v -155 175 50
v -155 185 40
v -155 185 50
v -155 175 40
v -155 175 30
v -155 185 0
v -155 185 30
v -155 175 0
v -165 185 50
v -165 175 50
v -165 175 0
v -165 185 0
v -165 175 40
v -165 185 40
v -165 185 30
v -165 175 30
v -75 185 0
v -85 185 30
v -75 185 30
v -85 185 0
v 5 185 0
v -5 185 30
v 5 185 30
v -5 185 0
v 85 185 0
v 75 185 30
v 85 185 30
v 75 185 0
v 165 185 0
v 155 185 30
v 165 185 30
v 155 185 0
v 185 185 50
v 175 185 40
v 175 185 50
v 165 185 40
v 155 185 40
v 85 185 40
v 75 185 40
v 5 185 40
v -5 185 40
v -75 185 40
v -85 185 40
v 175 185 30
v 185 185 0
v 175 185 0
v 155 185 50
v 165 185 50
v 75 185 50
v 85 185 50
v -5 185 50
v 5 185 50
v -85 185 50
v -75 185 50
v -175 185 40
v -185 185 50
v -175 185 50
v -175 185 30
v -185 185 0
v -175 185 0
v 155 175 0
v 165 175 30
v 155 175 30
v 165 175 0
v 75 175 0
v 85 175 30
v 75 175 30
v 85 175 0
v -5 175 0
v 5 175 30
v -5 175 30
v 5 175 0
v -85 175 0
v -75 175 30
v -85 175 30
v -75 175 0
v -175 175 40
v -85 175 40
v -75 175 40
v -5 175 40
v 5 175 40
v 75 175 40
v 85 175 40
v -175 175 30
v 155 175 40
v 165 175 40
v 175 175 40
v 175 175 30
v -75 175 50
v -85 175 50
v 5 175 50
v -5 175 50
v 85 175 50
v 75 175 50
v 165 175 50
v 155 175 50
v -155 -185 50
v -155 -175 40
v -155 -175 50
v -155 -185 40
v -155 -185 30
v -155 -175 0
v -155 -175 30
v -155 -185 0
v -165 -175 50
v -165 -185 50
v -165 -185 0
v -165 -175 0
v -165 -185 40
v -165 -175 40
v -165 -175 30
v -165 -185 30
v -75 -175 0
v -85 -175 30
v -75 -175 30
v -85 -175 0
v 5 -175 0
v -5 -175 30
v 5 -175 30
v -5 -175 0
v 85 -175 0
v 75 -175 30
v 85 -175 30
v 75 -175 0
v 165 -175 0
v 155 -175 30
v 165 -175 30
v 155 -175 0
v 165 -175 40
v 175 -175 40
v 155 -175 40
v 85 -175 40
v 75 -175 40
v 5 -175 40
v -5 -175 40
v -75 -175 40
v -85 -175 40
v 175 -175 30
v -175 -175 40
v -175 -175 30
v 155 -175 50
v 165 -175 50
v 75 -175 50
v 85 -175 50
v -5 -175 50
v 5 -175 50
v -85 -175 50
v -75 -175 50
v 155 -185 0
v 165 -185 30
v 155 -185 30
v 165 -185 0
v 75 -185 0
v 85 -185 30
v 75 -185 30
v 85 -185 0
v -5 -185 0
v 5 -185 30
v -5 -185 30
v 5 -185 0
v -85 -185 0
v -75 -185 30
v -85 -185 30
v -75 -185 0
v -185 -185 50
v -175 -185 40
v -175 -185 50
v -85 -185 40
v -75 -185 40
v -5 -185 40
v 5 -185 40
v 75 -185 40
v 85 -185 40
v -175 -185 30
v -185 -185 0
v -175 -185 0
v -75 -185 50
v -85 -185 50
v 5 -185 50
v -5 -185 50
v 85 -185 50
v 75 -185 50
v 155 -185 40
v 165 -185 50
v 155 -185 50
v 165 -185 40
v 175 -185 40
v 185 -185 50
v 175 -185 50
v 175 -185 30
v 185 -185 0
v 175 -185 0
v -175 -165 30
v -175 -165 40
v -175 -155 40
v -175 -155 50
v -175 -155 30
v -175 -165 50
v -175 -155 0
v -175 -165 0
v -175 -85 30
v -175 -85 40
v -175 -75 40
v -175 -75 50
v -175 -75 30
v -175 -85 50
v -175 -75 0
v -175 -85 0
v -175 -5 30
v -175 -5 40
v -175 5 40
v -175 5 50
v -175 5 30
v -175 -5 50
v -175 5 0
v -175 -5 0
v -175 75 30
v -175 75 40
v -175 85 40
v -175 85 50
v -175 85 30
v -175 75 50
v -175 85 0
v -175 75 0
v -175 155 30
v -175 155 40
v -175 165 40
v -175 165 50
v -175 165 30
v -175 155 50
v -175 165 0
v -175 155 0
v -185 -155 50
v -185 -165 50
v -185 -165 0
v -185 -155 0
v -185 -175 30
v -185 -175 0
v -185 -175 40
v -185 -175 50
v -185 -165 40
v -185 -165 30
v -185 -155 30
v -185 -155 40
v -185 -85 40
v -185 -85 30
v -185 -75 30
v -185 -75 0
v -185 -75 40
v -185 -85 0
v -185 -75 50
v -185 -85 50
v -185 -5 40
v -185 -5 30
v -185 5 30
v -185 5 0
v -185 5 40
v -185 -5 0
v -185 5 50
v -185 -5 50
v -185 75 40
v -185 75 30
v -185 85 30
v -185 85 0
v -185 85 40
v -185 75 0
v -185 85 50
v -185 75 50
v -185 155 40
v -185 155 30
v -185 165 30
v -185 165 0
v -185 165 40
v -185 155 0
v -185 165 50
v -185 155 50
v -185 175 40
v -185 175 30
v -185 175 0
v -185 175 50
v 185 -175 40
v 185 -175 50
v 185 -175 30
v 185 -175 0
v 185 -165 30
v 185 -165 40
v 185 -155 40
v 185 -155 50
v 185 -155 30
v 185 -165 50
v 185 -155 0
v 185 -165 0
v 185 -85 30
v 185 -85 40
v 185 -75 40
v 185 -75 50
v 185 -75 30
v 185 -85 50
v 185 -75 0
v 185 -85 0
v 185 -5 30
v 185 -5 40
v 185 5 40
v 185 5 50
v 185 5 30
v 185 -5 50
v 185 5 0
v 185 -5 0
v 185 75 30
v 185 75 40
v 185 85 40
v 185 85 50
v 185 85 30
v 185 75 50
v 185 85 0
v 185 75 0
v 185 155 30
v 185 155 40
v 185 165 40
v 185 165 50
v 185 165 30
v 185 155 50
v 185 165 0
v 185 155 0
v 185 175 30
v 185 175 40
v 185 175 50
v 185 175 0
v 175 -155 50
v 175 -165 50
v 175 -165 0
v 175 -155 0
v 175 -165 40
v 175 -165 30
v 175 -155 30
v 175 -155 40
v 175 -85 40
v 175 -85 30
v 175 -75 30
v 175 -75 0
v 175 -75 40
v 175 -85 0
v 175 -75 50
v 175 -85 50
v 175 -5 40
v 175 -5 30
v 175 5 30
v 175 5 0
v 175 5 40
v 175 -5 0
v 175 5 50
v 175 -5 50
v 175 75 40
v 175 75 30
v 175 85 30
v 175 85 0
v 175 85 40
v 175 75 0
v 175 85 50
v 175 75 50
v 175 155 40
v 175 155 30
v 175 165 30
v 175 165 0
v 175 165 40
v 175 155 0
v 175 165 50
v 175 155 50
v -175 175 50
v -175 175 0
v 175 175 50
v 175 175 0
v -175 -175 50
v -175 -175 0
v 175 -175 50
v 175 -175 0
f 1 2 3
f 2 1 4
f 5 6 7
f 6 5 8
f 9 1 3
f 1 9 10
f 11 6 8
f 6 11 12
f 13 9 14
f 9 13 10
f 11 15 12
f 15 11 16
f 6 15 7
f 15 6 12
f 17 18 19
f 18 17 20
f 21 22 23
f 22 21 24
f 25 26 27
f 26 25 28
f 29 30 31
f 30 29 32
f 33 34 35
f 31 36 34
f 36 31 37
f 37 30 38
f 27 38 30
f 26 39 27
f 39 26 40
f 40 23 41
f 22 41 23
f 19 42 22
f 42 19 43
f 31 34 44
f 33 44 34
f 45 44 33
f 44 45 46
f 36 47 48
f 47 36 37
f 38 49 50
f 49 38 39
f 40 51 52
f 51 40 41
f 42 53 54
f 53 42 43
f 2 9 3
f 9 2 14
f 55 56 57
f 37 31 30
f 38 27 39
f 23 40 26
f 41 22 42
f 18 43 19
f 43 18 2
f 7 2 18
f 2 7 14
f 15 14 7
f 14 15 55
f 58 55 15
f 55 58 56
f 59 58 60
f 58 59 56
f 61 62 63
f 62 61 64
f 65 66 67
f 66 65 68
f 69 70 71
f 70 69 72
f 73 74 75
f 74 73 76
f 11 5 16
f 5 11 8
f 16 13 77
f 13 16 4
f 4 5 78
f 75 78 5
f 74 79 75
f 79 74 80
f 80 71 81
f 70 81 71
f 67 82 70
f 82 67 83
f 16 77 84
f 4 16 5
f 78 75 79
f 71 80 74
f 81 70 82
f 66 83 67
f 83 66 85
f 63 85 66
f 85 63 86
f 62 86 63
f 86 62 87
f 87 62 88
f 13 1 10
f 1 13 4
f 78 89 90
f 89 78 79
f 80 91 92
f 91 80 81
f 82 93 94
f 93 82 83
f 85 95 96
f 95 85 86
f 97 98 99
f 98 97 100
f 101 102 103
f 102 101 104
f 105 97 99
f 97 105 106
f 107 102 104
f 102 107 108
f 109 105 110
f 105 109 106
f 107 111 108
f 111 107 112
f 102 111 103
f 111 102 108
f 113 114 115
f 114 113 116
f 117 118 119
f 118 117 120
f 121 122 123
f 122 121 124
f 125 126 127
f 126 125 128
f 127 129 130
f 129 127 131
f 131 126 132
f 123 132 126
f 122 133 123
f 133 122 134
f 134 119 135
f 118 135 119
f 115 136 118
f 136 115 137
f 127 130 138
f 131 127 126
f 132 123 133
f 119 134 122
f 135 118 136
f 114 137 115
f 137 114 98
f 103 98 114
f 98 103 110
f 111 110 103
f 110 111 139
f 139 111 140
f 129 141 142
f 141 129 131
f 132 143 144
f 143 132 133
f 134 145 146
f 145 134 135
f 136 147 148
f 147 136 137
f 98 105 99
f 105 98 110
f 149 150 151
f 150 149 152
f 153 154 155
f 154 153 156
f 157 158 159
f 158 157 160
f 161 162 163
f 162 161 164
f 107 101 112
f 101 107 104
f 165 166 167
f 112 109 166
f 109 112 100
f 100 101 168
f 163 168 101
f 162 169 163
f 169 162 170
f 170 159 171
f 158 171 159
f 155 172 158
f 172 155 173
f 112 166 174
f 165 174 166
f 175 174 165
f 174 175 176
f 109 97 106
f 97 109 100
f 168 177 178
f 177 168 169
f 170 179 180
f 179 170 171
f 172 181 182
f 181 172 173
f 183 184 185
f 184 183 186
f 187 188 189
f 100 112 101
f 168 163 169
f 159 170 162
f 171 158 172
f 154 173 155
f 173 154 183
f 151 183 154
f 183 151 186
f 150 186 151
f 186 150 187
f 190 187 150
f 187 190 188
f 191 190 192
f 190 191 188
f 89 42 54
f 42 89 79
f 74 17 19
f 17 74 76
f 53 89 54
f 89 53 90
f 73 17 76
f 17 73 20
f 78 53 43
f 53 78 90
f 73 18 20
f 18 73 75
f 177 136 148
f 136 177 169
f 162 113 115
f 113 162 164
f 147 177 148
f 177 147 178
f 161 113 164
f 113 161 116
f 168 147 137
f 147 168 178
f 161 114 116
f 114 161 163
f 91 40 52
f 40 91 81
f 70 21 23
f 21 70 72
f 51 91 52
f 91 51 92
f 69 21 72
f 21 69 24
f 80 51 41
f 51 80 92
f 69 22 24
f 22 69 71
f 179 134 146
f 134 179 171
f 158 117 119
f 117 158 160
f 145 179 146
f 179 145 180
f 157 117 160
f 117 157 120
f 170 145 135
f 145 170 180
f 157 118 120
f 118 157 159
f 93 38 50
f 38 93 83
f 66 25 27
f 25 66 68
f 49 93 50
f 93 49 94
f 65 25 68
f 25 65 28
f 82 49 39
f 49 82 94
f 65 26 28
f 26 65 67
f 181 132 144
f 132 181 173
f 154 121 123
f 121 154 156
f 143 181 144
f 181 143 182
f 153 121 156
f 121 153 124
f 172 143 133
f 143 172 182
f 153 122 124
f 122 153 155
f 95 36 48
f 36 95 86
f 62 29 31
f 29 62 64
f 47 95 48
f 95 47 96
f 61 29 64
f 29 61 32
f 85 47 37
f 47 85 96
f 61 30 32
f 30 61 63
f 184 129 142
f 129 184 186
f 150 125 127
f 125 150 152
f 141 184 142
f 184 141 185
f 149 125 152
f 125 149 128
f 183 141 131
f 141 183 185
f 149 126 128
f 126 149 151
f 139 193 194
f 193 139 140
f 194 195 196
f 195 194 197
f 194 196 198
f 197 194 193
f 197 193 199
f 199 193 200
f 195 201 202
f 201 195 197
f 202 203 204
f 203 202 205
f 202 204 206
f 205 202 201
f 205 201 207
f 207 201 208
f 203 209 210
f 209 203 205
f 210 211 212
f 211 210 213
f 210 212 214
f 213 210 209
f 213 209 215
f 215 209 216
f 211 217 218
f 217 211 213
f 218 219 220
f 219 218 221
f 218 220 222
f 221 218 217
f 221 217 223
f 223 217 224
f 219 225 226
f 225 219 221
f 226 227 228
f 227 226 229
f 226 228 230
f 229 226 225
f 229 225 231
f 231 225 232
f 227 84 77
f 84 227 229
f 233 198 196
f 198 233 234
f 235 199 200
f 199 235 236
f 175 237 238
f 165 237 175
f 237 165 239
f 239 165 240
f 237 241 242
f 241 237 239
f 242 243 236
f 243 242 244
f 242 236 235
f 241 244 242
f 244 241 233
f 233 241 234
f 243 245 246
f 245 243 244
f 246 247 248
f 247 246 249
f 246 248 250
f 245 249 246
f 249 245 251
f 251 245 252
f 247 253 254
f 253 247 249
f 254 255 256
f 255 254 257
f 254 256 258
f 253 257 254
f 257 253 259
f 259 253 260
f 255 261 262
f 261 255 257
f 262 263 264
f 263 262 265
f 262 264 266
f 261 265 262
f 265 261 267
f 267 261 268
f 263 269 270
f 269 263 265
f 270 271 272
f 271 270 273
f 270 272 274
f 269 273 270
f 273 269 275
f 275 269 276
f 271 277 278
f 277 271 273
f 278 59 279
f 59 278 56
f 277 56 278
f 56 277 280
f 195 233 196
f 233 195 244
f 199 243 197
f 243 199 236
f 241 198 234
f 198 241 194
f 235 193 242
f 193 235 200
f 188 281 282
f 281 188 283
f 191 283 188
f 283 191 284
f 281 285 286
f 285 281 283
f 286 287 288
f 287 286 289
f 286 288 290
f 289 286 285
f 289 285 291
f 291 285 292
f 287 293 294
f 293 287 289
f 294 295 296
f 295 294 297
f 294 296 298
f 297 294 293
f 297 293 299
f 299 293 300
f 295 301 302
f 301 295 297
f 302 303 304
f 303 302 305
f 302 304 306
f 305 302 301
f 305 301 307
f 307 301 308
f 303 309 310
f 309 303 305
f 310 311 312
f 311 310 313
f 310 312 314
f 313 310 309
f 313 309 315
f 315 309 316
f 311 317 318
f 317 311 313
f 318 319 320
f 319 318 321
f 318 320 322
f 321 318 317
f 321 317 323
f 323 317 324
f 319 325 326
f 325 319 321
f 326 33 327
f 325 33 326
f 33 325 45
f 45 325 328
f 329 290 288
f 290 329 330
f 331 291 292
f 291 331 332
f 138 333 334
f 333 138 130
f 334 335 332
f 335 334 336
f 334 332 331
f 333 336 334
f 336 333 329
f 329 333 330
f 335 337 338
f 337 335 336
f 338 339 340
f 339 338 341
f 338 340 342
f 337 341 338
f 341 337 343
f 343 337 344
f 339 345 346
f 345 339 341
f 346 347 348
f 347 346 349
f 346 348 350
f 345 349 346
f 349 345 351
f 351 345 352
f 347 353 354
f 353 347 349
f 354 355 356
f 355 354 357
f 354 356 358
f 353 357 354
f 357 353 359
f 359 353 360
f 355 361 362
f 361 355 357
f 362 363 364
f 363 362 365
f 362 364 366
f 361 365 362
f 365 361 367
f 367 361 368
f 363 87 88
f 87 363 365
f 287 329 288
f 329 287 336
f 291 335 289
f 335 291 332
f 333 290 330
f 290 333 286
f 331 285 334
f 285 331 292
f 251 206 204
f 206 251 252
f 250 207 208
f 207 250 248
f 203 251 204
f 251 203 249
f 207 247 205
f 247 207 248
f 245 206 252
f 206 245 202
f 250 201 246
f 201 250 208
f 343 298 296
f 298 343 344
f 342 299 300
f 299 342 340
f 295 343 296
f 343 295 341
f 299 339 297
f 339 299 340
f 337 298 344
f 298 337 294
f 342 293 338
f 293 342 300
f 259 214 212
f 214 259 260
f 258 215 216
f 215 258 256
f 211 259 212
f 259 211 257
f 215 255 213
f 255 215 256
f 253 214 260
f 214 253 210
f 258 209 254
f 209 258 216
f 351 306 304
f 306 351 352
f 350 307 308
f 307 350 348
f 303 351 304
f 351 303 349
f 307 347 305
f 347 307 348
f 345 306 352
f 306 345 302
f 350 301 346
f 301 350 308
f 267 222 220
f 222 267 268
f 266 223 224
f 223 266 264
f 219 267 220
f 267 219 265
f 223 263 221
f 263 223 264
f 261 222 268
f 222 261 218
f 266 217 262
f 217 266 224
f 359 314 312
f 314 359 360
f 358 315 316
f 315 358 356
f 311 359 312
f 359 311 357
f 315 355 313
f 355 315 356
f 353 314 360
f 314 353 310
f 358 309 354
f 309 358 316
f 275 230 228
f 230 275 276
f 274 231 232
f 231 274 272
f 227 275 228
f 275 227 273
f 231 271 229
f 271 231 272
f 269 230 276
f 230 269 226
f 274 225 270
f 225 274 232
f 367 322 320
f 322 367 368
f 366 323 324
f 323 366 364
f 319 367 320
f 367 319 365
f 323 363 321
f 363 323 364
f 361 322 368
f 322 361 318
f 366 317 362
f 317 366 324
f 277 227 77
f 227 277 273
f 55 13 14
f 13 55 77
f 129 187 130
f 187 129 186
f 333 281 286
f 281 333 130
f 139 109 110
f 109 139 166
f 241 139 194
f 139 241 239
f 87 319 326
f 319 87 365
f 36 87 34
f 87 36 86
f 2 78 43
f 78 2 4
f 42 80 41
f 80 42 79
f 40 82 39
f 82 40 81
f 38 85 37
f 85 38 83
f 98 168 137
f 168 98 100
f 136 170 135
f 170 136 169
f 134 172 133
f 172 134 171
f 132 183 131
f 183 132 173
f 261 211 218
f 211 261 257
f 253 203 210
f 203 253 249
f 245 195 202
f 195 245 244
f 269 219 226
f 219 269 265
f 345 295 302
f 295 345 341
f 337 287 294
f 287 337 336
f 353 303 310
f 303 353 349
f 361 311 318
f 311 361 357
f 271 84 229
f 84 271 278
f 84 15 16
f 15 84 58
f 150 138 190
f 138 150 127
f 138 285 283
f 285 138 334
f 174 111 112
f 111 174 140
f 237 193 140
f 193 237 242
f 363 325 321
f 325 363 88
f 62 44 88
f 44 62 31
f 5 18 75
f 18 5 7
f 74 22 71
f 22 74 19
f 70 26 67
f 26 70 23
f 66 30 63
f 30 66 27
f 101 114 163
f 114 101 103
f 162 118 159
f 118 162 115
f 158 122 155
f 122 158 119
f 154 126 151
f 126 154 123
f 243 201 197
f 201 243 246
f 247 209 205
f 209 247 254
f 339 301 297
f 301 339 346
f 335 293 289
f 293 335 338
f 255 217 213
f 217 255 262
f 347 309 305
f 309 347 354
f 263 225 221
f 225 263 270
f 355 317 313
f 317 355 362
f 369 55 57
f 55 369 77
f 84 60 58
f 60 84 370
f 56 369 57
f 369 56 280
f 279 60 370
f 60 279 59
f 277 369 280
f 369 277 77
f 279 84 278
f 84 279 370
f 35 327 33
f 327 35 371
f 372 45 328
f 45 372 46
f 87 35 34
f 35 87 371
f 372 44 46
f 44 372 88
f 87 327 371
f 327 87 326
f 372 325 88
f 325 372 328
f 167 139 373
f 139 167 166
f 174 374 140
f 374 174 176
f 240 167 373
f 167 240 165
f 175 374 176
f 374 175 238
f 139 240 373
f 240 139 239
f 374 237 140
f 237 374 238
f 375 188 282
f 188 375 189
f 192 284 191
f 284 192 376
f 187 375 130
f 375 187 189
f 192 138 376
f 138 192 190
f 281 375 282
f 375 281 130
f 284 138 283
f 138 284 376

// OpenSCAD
// Cage slice 1
// Internal cavity: 350 x 350 x 700 mm
// Bar thickness: 10 mm (square)
// Gap between bars: 70 mm (uniform)
// Slice index: 1, slice Z range: [50, 100] (local coordinates 0..50)
// This file places the slice with its bottom on Z=0; when assembling, translate in Z by 50 mm.
// Export to STL with OpenSCAD: Render -> Export as STL.

bar = 10;
gap = 70;
s = bar + gap;
$fn = 64;  // cylinder resolution

x_centers = [-160, -80, 0, 80, 160];
y_centers = [-160, -80, 0, 80, 160];
z_centers = [5, 85, 165, 245, 325, 405, 485, 565, 645];

slice_index = 1;
slice_h = 50;

front_y = 180;
back_y = -180;
left_x = -180;
right_x = 180;
panel_length = 370;

hole_diam = 6.6;

module slice() {
    union() {
        // vertical bars on front and back (along Z)
        for (x = x_centers) {
            translate([x, front_y, slice_h/2]) cube([bar, bar, slice_h], center=true);
            translate([x, back_y, slice_h/2])  cube([bar, bar, slice_h], center=true);
        }
        // vertical bars on left and right (along Z)
        for (y = y_centers) {
            translate([left_x, y, slice_h/2])  cube([bar, bar, slice_h], center=true);
            translate([right_x, y, slice_h/2]) cube([bar, bar, slice_h], center=true);
        }
        // explicit corner vertical bars (ensure 4 corners for M6 rods)
        translate([-180, 180, slice_h/2]) cube([bar, bar, slice_h], center=true);
        translate([180, 180, slice_h/2]) cube([bar, bar, slice_h], center=true);
        translate([-180, -180, slice_h/2]) cube([bar, bar, slice_h], center=true);
        translate([180, -180, slice_h/2]) cube([bar, bar, slice_h], center=true);

        // horizontal bars (10 mm thick in Z) that lie inside this slice
        for (zc = z_centers) {
            z_local = zc - slice_index*slice_h;
            // include this horizontal bar if its center lies within this slice and it fits entirely here
            if (z_local >= bar/2 && z_local <= slice_h - bar/2) {
                // front and back horizontal bars (run along X)
                translate([0, front_y, z_local]) cube([panel_length, bar, bar], center=true);
                translate([0, back_y,  z_local]) cube([panel_length, bar, bar], center=true);
                // left and right horizontal bars (run along Y)
                translate([left_x, 0, z_local]) cube([bar, panel_length, bar], center=true);
                translate([right_x,0, z_local]) cube([bar, panel_length, bar], center=true);
            }
        }
    }
}

difference() {
    slice();
    // four vertical holes for M6 rods through corner bars (slightly longer than slice to ensure clean subtraction)
    translate([-180, 180, slice_h/2]) rotate([0,0,0]) cylinder(h = slice_h*4, r = hole_diam/2, center=true);
    translate([180, 180, slice_h/2]) rotate([0,0,0]) cylinder(h = slice_h*4, r = hole_diam/2, center=true);
    translate([-180, -180, slice_h/2]) rotate([0,0,0]) cylinder(h = slice_h*4, r = hole_diam/2, center=true);
    translate([180, -180, slice_h/2]) rotate([0,0,0]) cylinder(h = slice_h*4, r = hole_diam/2, center=true);
}

slice();
